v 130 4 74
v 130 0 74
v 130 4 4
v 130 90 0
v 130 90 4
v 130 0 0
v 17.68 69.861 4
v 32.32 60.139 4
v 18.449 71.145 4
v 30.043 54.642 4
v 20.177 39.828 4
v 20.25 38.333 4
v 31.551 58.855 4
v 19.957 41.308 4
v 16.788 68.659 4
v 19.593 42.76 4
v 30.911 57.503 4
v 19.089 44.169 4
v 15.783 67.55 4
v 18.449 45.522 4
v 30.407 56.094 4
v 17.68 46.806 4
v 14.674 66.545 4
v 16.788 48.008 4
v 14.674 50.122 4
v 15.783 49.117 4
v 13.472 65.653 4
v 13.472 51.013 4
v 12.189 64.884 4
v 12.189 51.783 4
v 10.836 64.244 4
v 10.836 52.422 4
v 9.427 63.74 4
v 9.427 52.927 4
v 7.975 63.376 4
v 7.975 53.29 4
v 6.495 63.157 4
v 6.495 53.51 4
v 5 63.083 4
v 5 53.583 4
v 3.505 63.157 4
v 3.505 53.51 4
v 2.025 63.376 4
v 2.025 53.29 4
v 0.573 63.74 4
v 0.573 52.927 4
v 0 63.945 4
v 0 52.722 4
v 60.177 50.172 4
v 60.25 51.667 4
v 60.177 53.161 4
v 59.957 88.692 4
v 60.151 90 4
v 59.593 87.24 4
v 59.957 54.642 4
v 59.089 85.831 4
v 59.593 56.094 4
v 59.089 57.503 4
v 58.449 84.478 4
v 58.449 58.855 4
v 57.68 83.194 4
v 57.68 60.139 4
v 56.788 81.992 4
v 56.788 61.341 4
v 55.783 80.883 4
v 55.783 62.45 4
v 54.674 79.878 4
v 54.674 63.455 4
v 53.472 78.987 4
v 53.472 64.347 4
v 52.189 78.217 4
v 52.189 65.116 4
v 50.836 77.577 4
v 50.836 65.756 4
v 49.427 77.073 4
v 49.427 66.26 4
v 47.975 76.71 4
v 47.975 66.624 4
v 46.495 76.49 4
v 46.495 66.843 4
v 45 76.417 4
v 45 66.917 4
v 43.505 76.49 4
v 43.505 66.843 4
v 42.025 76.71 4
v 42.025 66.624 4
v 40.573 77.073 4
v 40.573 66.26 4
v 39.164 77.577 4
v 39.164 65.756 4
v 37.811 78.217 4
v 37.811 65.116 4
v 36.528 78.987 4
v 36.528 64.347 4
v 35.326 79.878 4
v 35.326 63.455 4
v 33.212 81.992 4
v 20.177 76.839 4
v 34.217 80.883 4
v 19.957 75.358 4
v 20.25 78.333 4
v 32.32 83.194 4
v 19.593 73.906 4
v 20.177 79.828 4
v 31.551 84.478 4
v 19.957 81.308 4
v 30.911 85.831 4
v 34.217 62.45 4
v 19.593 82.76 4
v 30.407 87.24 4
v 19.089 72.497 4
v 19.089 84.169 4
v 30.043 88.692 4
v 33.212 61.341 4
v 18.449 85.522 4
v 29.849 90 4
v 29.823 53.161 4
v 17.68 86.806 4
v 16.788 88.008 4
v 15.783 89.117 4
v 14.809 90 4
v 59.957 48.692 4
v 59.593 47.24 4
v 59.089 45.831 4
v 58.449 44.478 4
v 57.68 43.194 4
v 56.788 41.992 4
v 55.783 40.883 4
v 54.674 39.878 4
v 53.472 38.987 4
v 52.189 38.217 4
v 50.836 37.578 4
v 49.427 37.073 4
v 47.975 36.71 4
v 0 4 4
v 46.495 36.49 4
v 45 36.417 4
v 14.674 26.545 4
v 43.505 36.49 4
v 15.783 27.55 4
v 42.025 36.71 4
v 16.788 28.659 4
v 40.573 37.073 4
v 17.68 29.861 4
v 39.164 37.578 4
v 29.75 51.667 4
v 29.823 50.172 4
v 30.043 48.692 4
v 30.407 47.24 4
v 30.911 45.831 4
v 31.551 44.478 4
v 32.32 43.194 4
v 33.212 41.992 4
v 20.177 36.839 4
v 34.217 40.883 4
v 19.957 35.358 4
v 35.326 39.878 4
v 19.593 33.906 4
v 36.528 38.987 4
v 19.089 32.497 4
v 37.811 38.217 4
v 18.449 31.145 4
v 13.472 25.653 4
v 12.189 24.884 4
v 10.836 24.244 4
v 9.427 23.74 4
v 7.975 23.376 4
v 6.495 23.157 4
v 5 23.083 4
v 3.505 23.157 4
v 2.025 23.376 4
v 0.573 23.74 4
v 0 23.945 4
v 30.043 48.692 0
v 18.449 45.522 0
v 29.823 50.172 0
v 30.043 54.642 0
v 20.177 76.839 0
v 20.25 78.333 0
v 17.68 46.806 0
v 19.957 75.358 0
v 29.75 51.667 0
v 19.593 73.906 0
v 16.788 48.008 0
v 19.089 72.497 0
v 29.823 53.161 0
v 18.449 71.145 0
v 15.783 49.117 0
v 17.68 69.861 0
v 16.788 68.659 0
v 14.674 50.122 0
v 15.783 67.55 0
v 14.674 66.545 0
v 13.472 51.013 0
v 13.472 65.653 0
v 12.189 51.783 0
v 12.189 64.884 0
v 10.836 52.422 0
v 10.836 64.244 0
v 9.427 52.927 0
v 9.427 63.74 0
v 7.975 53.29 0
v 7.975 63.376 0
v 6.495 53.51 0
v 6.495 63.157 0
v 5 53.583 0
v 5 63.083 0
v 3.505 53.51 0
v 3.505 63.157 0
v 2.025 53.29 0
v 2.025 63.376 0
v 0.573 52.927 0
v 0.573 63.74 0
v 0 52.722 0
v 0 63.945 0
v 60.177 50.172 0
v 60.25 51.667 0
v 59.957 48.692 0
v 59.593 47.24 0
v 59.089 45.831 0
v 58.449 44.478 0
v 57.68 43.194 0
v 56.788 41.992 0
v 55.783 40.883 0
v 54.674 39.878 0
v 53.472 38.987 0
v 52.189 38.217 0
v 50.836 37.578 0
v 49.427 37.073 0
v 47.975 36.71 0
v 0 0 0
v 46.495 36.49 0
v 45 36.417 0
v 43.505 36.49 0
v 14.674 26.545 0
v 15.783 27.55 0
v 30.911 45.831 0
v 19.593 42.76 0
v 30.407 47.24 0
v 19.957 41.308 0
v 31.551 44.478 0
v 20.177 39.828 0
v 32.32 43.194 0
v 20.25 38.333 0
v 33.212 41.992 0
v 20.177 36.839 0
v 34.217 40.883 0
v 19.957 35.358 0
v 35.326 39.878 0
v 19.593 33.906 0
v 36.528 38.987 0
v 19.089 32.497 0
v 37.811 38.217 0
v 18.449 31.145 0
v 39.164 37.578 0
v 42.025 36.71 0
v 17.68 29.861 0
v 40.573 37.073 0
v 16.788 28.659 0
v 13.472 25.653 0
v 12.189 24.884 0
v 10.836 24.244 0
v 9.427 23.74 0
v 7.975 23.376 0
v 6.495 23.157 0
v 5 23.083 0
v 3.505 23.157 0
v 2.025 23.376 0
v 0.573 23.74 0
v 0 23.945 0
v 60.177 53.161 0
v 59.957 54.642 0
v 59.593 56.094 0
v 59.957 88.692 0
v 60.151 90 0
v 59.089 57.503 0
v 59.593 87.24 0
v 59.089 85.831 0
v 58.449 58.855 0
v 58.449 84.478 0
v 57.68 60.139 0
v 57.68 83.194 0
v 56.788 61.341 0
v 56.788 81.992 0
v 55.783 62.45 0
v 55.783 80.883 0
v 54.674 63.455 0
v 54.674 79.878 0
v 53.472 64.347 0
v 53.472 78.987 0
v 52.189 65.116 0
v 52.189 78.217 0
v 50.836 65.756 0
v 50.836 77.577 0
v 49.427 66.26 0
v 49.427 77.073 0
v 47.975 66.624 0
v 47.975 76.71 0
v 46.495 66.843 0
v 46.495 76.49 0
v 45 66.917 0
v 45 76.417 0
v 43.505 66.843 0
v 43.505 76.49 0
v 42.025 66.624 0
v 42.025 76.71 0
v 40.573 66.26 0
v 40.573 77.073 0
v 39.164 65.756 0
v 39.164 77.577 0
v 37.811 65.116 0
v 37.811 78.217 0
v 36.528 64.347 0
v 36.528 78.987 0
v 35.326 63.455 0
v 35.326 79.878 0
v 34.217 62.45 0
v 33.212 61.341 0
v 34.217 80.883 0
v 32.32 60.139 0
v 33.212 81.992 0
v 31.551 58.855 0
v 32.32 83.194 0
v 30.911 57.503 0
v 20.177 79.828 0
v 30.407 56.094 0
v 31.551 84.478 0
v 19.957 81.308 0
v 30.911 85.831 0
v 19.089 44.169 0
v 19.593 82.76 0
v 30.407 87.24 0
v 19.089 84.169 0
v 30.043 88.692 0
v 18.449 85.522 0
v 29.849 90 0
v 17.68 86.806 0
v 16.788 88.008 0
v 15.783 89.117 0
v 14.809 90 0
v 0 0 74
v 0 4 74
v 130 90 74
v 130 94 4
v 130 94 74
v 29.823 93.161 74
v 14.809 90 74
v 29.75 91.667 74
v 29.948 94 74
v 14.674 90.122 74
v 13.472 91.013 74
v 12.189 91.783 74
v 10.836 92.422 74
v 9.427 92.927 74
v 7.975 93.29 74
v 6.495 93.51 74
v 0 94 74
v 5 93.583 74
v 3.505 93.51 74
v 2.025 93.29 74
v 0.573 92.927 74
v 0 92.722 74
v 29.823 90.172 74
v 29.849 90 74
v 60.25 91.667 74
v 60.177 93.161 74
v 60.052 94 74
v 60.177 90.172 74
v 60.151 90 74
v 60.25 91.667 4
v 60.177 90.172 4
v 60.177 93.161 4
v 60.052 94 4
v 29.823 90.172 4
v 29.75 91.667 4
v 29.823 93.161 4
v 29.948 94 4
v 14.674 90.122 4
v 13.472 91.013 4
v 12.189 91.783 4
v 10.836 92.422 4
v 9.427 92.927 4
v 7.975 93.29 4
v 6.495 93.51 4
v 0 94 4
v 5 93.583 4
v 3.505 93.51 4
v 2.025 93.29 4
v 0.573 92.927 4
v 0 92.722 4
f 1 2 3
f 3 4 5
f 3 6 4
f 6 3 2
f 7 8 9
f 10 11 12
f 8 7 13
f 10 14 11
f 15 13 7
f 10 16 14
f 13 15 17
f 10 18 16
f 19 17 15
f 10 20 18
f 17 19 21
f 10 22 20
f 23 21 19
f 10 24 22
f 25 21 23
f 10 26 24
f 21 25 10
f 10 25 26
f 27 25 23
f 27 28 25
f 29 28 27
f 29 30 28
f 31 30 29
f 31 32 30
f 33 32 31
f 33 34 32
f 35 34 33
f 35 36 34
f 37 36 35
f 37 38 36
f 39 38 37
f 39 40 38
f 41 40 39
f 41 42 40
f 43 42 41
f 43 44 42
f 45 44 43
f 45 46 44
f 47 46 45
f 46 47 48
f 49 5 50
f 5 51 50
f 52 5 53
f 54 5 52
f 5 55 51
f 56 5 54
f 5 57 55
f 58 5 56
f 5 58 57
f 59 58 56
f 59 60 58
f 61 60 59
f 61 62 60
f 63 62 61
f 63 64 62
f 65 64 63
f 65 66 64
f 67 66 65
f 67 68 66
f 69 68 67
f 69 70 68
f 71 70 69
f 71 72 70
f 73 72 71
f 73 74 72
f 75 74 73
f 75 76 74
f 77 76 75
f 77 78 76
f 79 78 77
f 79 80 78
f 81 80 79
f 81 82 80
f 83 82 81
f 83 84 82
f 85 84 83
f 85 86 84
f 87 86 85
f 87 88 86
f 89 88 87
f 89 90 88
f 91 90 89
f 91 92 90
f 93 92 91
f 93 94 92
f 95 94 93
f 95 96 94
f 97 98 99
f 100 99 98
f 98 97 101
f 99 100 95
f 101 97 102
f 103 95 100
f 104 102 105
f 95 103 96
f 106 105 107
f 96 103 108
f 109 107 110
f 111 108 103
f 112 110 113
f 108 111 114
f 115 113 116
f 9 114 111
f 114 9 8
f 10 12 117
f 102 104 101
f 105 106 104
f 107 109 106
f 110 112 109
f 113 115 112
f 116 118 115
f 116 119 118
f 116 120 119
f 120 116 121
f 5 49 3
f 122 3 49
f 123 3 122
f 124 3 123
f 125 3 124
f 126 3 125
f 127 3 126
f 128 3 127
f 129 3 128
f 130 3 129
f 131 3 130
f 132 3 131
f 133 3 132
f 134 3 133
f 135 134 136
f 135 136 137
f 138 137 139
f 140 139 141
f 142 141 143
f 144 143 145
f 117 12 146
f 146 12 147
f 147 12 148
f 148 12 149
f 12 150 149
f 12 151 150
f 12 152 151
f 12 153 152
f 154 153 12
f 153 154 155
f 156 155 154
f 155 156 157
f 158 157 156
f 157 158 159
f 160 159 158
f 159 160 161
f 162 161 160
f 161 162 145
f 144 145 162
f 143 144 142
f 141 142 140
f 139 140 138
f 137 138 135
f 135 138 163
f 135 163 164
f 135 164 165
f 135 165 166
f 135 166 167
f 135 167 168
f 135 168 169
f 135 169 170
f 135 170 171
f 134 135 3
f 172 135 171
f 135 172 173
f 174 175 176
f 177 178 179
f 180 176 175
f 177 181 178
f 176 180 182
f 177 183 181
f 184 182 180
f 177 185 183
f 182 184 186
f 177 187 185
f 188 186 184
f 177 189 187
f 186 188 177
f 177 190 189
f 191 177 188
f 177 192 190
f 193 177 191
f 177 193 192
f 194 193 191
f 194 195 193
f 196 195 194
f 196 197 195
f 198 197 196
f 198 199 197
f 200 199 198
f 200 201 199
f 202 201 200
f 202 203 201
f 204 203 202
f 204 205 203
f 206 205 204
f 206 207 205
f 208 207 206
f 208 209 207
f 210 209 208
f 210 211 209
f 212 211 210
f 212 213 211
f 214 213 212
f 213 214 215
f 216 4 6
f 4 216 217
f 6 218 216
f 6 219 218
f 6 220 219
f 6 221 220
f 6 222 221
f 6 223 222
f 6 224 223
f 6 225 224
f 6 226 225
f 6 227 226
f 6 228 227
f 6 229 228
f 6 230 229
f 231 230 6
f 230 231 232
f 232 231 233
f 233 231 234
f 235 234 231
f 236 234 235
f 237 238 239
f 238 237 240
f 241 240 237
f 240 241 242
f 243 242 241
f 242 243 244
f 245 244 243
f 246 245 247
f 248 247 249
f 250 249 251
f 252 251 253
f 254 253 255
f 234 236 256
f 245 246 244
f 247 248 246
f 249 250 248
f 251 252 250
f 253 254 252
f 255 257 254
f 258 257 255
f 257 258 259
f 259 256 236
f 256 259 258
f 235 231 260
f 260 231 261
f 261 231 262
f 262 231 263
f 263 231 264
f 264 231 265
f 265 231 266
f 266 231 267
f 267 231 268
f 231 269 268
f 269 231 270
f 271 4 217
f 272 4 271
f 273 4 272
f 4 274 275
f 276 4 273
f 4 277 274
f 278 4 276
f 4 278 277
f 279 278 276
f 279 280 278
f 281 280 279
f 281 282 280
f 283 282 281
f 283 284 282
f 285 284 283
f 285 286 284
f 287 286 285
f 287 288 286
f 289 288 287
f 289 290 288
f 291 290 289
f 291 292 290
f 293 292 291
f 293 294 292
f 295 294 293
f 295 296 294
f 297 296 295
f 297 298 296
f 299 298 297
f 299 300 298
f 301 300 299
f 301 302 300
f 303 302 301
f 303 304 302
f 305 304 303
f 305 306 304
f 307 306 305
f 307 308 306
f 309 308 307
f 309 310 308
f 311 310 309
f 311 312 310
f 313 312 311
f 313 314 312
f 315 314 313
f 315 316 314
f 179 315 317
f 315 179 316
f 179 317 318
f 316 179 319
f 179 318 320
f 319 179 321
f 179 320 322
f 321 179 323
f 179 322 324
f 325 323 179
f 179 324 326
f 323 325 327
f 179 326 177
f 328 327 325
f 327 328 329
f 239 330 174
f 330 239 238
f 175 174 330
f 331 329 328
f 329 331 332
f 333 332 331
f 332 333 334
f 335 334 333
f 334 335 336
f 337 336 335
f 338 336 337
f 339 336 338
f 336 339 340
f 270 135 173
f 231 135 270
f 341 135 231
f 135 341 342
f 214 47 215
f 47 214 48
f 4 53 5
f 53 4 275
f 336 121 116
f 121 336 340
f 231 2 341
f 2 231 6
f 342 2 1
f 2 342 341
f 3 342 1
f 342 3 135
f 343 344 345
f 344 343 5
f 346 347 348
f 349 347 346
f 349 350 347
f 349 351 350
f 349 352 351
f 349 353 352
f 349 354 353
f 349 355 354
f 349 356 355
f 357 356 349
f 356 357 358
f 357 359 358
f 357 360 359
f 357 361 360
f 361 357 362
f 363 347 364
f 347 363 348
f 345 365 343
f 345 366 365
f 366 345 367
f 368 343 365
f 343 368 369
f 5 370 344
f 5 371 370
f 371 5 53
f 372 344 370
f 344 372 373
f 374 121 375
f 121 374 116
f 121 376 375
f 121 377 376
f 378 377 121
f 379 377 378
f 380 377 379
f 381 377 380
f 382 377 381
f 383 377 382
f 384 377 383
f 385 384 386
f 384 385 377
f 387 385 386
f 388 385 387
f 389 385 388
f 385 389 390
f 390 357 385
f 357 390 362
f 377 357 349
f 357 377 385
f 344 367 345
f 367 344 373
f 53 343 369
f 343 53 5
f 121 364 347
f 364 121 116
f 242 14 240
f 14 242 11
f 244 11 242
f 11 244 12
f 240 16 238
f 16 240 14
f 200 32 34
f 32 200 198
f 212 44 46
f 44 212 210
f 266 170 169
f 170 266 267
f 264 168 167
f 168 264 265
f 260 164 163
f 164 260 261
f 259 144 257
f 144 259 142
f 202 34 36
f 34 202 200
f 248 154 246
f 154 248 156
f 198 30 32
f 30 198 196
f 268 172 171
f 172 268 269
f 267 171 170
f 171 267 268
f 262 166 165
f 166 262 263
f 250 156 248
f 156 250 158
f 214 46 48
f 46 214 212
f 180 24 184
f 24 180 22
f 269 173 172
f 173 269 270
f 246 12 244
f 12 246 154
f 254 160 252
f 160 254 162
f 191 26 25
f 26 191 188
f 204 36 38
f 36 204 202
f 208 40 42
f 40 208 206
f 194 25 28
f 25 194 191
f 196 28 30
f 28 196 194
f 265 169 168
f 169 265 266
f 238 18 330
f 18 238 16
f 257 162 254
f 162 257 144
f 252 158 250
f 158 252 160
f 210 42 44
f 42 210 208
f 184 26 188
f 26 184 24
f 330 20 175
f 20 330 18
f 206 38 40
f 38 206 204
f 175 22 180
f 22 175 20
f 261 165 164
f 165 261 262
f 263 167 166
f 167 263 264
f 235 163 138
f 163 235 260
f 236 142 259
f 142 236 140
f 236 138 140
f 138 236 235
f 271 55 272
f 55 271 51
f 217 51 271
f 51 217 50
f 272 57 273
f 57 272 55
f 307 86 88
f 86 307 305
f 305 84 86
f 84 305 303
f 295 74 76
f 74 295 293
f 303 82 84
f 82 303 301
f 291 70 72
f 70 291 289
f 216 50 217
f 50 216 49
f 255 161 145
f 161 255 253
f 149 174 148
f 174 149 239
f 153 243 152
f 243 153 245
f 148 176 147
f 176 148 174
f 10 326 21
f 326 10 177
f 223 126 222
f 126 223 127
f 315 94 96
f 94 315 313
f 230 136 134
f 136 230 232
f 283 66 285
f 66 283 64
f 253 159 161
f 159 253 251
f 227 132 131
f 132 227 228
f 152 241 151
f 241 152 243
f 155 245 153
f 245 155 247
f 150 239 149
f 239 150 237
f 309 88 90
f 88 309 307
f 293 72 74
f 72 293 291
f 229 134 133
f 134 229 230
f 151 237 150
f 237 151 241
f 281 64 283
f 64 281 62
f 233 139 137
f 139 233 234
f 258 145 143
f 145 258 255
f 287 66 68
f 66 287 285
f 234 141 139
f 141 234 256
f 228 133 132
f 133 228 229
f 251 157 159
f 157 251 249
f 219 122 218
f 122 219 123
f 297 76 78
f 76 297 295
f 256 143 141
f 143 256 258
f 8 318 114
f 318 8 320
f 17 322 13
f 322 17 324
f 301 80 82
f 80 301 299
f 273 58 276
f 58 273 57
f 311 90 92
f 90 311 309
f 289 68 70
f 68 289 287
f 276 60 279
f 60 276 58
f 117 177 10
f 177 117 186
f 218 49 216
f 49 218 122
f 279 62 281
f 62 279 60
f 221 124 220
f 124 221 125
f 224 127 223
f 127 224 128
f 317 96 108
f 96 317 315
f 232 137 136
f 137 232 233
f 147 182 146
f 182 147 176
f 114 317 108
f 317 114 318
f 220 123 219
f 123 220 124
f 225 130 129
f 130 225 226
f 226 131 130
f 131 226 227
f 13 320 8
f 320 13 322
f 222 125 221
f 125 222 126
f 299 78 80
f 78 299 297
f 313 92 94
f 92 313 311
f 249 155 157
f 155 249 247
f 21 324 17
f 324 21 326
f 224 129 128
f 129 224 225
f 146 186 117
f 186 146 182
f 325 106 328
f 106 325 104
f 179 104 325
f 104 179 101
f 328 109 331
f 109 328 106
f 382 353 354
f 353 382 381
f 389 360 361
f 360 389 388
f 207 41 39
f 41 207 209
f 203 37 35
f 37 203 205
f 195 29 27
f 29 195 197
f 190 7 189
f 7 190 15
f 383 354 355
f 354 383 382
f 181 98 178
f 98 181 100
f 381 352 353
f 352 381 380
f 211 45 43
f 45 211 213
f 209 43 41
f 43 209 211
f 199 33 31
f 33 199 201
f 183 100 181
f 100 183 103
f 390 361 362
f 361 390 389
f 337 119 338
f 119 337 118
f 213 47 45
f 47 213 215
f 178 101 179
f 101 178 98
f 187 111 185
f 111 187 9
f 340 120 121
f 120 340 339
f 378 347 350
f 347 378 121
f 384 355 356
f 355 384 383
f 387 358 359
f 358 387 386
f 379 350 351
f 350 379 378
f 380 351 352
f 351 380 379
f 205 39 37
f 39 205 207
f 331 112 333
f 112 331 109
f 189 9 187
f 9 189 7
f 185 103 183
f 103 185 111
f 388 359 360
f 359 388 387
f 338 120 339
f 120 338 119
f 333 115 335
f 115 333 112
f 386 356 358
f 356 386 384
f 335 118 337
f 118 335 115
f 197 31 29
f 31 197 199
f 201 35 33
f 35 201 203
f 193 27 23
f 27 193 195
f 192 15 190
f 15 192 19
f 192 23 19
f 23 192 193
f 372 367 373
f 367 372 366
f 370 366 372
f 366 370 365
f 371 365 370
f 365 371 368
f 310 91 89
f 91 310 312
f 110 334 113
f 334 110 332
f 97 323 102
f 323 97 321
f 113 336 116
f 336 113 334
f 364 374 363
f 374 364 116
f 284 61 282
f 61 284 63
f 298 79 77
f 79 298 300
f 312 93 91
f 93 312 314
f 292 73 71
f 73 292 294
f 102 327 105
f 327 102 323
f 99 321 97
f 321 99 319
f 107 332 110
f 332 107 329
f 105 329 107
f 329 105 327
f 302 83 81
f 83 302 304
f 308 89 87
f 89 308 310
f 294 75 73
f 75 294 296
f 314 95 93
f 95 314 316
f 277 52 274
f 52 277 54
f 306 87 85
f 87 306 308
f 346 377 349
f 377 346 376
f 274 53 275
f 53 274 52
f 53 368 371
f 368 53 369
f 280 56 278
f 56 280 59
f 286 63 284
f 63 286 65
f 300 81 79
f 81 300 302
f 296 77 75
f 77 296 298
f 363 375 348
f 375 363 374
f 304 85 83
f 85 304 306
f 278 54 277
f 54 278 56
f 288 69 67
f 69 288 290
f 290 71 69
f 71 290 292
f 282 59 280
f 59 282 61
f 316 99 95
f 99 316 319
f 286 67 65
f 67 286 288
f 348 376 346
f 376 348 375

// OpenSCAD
// Rack for six 50 mL conical (Falcon-type) tubes.
// Print orientation: Flat plate on bed (z=0), walls rising to z=70.
// After printing, flip over so walls are on the bed and tubes hang down.

// Plate dimensions
L     = 130;   // Length (X)
W     = 90;    // Width (Y)
t     = 4;     // Plate thickness (Z)

// Hole specifications
n_holes = 6;
hole_d  = 30.5;
// Grid layout: 2 rows (Y), 3 columns (X)
// Spacing 40mm centre-to-centre
dx = 40;
dy = 40;

// Wall specifications
wall_h = 70;   // Total height of wall from plate top (z=4)
wall_t = 4;    // Wall thickness (Y)

// Derived positions
// Centring the grid on the plate
x_offset = (L - (n_holes - 1) * dx) / 2;
y_offset = (W - (2 - 1) * dy) / 2;

// Total height of the assembly (plate + wall)
total_h = t + wall_h;

$fn = 64;

difference() {
    union() {
        // 1. The Base Plate
        translate([0, 0, 0])
            cube([L, W, t]);
        
        // 2. The Side Walls
        // Wall 1: Left side (Y = 0), rising from z=t to z=total_h
        translate([0, 0, t])
            cube([L, wall_t, wall_h]);
            
        // Wall 2: Right side (Y = W), rising from z=t to z=total_h
        translate([0, W, t])
            cube([L, wall_t, wall_h]);
    }
    
    // 3. Subtract Holes
    // We subtract cylinders that extend slightly past the top of the walls to ensure clean cuts.
    for (i = [0 : n_holes - 1]) {
        // Map index i to row and column
        // Rows are along Y (0 to 1), Columns along X (0 to 2)
        row = i / 3;
        col = i % 3;
        
        x_pos = x_offset + col * dx;
        y_pos = y_offset + row * dy;
        
        // Subtract cylinder extending past the top of the walls
        translate([x_pos, y_pos, 0])
            cylinder(h = total_h + 1, d = hole_d);
    }
}
